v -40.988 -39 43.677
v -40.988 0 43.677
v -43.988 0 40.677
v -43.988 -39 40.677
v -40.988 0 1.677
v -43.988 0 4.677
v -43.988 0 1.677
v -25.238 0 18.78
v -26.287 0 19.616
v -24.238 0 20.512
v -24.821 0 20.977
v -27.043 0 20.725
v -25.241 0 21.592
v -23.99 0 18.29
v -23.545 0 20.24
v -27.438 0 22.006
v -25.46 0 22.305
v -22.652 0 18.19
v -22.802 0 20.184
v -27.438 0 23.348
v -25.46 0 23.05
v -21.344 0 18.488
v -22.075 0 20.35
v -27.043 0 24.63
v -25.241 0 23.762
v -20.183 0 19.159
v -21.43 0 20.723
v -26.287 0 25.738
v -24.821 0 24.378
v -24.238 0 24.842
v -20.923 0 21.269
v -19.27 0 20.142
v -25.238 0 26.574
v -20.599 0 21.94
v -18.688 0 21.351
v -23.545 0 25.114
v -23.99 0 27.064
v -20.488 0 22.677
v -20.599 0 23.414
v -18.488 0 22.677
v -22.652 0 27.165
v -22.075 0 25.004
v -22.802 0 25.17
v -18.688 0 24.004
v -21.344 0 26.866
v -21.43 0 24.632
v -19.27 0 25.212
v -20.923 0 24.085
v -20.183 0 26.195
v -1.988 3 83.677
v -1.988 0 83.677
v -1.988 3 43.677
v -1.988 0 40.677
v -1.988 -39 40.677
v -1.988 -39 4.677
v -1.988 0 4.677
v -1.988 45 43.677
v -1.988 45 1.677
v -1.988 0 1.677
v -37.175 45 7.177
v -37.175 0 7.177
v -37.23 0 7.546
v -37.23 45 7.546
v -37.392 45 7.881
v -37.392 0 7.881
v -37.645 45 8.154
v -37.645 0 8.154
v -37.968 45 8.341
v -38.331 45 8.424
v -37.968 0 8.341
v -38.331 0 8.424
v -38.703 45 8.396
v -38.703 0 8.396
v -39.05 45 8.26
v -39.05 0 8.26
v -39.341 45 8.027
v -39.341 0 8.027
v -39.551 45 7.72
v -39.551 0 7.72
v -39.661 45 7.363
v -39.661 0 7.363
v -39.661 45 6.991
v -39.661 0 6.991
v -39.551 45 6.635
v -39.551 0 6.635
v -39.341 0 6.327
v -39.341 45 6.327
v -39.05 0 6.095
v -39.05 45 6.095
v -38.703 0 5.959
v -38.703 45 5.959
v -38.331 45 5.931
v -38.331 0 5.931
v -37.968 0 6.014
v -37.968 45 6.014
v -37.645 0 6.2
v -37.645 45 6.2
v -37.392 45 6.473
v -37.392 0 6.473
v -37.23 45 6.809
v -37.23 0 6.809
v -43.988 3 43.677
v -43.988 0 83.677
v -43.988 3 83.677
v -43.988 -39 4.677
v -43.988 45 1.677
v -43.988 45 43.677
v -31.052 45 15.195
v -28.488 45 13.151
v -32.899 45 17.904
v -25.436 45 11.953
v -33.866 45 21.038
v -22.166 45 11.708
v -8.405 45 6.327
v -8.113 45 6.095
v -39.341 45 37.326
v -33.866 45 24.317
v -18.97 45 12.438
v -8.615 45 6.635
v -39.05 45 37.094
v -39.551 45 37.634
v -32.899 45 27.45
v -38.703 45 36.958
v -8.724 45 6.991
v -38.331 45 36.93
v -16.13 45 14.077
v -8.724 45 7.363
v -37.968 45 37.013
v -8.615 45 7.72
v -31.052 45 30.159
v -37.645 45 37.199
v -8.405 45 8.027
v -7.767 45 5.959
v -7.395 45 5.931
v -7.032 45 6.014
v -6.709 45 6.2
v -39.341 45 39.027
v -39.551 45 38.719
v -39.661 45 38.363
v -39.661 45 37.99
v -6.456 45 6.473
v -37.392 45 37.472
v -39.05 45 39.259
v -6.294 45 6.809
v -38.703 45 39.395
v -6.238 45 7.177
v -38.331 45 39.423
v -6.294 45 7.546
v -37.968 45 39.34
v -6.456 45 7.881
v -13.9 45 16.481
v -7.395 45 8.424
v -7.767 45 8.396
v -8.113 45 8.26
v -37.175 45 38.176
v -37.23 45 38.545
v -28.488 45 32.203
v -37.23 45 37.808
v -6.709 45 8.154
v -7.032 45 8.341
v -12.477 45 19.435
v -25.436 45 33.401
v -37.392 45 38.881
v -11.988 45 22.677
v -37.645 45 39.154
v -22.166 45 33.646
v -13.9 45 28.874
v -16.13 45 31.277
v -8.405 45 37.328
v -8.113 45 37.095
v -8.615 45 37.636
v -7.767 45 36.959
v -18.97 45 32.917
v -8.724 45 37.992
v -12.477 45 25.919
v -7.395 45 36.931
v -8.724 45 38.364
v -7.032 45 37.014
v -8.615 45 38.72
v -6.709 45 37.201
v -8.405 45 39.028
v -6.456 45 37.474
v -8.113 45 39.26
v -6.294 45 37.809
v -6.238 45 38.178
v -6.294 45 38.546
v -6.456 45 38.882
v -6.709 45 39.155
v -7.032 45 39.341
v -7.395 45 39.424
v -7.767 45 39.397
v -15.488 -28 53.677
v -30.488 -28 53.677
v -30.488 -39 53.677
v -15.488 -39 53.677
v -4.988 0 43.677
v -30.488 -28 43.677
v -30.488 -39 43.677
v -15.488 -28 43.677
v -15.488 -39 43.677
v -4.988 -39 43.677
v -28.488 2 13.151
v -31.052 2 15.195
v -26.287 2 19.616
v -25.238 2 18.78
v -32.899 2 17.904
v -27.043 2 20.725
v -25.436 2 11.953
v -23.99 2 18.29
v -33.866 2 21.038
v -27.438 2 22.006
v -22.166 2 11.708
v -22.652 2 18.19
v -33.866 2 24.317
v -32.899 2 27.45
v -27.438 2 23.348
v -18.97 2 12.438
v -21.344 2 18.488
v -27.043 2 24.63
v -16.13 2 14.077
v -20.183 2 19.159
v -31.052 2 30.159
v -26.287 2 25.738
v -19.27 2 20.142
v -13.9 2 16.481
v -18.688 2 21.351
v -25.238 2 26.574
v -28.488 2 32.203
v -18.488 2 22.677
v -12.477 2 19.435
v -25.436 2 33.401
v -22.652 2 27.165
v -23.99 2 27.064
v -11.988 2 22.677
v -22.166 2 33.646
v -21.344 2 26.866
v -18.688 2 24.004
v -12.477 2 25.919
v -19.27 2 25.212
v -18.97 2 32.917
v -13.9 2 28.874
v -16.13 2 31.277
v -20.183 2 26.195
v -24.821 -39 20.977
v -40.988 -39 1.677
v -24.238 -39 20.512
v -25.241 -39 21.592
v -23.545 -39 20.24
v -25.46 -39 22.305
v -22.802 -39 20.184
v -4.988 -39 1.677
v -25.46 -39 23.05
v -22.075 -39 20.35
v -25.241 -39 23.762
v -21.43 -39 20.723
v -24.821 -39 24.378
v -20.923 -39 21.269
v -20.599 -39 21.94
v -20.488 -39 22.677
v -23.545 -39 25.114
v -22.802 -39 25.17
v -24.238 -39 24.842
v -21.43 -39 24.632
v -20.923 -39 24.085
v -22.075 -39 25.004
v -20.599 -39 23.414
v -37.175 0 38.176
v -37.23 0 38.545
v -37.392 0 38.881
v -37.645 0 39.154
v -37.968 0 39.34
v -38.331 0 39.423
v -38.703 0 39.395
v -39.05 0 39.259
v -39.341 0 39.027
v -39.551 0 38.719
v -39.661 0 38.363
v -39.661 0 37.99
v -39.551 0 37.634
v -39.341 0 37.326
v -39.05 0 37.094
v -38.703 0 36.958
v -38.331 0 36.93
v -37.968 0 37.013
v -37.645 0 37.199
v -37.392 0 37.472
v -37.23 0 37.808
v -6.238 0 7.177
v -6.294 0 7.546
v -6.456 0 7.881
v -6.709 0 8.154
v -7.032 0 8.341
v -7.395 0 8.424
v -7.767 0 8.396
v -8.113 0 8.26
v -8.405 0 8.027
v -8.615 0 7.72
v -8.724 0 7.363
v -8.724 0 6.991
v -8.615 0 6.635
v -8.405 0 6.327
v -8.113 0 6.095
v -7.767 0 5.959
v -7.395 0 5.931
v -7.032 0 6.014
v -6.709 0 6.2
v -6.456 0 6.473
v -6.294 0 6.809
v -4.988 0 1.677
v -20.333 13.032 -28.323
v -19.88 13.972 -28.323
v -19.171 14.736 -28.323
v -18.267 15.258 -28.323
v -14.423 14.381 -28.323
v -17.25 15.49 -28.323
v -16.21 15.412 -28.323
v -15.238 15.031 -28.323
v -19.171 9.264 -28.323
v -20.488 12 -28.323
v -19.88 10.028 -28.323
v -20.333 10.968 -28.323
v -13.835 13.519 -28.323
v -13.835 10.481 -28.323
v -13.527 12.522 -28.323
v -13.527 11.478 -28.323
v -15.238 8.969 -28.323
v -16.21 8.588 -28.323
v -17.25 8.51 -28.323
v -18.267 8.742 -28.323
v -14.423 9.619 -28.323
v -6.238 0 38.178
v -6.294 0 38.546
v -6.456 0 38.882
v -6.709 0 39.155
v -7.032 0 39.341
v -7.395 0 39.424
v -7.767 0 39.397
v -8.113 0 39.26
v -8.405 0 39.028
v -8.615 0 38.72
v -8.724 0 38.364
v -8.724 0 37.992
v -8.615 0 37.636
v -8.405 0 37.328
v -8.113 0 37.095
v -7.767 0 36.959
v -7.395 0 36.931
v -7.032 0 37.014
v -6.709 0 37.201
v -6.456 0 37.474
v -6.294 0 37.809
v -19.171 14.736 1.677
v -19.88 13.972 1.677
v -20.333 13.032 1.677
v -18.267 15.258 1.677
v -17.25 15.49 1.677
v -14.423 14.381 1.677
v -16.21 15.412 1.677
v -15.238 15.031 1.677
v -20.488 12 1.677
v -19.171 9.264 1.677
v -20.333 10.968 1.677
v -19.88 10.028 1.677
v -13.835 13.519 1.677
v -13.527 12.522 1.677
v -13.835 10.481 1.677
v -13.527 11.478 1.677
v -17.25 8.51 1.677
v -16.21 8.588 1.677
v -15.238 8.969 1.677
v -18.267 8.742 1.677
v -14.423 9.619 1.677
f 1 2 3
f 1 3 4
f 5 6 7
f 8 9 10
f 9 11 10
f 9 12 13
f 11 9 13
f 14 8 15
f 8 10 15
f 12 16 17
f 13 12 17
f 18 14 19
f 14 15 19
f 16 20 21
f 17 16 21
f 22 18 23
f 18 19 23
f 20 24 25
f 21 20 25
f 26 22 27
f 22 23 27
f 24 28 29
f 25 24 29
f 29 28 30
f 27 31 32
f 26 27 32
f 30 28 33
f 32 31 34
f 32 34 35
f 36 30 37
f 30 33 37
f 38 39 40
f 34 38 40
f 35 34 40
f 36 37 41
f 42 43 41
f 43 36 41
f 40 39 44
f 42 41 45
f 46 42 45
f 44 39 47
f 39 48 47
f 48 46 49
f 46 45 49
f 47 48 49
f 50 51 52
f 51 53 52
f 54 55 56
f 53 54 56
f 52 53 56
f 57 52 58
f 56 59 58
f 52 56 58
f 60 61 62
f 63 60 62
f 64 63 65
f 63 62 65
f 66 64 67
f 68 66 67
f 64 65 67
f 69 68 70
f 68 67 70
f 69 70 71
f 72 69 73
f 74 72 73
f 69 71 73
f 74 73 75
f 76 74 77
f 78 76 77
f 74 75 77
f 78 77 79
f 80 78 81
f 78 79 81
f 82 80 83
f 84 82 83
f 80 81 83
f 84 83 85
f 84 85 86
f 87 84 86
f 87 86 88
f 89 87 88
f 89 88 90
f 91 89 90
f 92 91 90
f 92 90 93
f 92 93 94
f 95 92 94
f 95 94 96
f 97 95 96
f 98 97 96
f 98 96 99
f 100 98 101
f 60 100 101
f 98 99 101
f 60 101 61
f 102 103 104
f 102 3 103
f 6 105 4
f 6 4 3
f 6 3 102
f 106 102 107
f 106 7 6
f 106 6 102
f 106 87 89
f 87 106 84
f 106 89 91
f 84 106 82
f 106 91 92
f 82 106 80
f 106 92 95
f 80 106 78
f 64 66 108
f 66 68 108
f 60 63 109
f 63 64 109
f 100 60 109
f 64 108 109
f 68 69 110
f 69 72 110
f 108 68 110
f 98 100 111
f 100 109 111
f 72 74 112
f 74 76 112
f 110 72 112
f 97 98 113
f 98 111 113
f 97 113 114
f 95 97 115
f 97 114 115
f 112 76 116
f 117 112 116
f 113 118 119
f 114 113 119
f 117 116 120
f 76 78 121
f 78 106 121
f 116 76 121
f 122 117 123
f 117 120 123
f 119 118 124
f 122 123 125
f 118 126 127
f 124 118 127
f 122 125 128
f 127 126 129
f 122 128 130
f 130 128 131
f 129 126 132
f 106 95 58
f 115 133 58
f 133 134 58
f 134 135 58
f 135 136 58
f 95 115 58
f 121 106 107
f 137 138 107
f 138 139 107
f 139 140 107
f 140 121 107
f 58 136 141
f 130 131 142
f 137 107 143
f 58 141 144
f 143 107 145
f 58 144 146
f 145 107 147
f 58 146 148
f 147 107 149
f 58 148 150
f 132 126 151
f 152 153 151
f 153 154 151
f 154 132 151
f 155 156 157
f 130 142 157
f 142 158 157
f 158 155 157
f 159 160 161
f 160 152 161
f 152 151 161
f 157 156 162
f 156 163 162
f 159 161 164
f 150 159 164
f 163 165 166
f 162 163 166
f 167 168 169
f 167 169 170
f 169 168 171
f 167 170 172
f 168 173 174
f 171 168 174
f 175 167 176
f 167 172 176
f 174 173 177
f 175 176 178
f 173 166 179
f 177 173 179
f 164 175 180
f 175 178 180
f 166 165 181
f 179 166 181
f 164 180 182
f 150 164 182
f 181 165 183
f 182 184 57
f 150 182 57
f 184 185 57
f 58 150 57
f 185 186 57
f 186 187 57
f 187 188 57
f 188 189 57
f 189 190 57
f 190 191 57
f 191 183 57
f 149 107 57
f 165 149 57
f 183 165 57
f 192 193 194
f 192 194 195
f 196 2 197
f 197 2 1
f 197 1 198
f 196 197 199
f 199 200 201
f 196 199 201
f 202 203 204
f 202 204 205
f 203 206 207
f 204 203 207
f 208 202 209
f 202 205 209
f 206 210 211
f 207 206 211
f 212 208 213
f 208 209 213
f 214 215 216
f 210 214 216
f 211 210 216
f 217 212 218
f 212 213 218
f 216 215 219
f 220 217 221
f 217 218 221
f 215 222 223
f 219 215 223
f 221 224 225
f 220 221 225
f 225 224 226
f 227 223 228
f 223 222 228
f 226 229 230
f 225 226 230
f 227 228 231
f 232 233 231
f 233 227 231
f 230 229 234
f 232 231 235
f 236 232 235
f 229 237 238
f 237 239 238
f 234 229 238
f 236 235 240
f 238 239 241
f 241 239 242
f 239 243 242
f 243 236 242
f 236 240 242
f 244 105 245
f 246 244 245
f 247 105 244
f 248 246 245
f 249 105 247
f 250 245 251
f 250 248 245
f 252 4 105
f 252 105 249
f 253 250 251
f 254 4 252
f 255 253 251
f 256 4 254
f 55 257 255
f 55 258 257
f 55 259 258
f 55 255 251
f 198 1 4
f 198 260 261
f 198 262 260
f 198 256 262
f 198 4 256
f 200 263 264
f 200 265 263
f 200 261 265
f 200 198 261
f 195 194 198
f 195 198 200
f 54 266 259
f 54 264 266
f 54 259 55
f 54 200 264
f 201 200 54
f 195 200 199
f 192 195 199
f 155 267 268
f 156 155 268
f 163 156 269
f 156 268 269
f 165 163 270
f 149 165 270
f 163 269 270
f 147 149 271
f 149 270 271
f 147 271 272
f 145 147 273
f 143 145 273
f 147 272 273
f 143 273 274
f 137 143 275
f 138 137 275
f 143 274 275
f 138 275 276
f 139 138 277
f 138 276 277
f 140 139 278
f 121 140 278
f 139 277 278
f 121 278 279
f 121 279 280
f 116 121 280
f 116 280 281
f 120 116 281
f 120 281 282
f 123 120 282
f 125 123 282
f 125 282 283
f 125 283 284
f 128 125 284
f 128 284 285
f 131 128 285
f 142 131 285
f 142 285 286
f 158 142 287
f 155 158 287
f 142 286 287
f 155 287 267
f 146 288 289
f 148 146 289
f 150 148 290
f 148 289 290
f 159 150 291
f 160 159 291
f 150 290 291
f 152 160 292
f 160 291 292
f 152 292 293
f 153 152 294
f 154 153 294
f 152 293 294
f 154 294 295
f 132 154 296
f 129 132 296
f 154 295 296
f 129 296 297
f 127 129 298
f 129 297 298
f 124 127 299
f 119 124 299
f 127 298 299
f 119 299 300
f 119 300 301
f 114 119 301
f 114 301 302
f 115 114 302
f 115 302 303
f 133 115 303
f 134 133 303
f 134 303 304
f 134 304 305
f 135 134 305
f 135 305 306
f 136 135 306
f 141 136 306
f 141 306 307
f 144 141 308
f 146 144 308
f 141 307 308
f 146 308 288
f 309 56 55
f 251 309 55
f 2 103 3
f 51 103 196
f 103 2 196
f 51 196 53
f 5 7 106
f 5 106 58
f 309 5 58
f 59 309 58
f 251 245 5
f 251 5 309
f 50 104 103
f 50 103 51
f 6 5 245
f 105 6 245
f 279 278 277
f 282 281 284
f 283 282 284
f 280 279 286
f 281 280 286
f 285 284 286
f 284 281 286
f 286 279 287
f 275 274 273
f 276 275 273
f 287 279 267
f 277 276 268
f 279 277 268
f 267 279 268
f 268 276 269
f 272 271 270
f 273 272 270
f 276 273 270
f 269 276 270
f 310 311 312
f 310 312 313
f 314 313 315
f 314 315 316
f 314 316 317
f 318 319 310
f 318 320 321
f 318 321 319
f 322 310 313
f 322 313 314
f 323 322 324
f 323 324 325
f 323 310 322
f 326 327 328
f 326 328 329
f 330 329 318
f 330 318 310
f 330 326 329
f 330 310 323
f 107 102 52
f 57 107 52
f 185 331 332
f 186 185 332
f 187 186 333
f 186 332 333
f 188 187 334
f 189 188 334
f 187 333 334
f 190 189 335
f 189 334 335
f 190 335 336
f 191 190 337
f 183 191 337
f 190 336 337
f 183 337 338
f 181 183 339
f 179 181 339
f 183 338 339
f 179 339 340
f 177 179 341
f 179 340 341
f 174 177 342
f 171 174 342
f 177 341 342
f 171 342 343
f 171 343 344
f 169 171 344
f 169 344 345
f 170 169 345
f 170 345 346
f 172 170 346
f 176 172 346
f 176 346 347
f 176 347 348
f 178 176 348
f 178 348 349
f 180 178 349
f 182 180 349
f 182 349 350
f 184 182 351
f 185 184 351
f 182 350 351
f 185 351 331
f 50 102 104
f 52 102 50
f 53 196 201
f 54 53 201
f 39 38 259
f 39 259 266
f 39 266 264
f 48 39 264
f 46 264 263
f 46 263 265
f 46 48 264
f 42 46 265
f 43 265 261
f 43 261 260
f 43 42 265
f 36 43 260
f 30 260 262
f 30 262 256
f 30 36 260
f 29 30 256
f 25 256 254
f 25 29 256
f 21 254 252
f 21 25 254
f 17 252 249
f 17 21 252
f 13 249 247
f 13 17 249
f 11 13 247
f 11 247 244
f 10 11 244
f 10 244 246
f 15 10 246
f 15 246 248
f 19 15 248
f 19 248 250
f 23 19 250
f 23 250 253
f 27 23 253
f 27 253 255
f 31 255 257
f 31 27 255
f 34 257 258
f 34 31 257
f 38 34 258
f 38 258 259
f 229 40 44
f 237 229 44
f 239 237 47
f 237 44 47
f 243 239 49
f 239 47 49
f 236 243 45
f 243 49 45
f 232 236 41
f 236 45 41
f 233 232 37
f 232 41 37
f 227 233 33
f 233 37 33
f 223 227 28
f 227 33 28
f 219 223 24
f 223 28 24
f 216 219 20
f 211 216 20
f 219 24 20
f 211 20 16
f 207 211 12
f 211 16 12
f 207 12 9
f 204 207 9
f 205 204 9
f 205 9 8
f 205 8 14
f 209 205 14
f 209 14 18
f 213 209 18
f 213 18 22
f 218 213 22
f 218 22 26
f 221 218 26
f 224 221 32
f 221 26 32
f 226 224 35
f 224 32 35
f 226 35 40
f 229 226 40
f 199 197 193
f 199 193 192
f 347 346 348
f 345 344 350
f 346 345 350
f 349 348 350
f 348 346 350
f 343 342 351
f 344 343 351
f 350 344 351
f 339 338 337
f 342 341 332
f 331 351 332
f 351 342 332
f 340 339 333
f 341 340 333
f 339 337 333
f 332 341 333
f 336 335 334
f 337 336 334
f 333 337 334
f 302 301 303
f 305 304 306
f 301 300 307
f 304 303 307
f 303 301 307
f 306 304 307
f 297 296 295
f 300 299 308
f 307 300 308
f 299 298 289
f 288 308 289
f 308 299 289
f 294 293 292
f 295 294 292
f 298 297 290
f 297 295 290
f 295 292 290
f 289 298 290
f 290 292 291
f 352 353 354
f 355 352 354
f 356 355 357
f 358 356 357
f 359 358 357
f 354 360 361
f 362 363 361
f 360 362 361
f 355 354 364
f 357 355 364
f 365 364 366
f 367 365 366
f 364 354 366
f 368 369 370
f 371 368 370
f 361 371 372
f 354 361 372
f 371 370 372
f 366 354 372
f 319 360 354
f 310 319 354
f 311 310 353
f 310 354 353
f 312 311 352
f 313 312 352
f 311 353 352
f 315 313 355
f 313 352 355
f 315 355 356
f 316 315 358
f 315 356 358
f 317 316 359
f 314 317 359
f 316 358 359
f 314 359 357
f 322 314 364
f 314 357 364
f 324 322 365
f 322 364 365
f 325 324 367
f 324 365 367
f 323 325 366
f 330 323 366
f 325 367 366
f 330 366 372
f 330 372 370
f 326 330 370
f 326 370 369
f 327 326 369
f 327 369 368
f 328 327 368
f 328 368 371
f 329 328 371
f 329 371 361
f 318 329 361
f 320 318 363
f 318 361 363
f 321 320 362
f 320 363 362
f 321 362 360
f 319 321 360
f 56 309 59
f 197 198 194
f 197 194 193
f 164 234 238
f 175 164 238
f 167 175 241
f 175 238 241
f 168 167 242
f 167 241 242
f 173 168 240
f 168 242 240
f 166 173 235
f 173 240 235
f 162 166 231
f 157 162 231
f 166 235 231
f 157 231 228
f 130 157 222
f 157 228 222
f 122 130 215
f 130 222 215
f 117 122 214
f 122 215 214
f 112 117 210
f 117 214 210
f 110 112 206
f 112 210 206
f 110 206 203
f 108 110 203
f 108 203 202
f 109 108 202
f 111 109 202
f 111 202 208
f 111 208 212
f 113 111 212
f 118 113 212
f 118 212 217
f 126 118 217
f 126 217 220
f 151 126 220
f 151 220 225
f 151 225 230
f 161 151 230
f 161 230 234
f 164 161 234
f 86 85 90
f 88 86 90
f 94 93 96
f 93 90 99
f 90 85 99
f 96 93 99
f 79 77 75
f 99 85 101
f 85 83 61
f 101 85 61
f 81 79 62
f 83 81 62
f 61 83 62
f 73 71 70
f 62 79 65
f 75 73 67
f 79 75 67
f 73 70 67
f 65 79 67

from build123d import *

# Parameters (mm, degrees)
F0_W      = 42
F0_H      = 42
F0_R      = 1.25
F0_R_2    = 11
F0_R_3    = 4.5
F0_R_4    = 2.5
F1_DEPTH  = 39
F2_SIZE   = 3
F3_DEPTH  = 2
F5_W      = 15
F5_H      = 11
F6_DEPTH  = 10
F7_DEPTH  = 45
F8_W      = 42
F8_H      = 3
F9_DEPTH  = 40
F11_DEPTH = 30


# Not quite as in the source:
# - the program builds the solid bodies; features that only make, move or delete a surface that nothing else refers to are left out


with BuildPart() as f1:
    # F0 (on Front) → F1 (new body)
    with BuildSketch(Plane.XZ):
        with Locations((-22.9883964362, 22.6771618161)):
            Rectangle(F0_W, F0_H)
        with Locations((-38.4247341791, 7.1771618161)):
            Circle(F0_R, mode=Mode.SUBTRACT)
        with Locations((-7.4883964362, 7.1771618161)):
            Circle(F0_R, mode=Mode.SUBTRACT)
        with Locations((-38.4247341791, 38.1764436699)):
            Circle(F0_R, mode=Mode.SUBTRACT)
        with Locations((-22.9883964362, 22.6771618161)):
            Circle(F0_R_2, mode=Mode.SUBTRACT)
        with Locations((-7.4883964362, 38.1778829577)):
            Circle(F0_R, mode=Mode.SUBTRACT)
        with Locations((-22.9883964362, 22.6771618161)):
            Circle(F0_R_2)
        with Locations((-22.9883964362, 22.6771618161)):
            Circle(F0_R_3, mode=Mode.SUBTRACT)
        with Locations((-22.9883964362, 22.6771618161)):
            Circle(F0_R_3)
        with Locations((-22.9883964362, 22.6771618161)):
            Circle(F0_R_4, mode=Mode.SUBTRACT)
        with Locations((-38.4247341791, 38.1764436699)):
            Circle(F0_R)
        with Locations((-7.4883964362, 7.1771618161)):
            Circle(F0_R)
        with Locations((-38.4247341791, 7.1771618161)):
            Circle(F0_R)
        with Locations((-7.4883964362, 38.1778829577)):
            Circle(F0_R)
    extrude(amount=F1_DEPTH)

    # F2
    f2_edges = [f1.edges().sort_by_distance(p)[0] for p in [
        (-43.988396, -19.5, 1.677162),
        (-1.988396, -19.5, 1.677162),
        (-1.988396, -19.5, 43.677162),
        (-43.988396, -19.5, 43.677162),
    ]]
    chamfer(f2_edges, length=F2_SIZE)

    # F0 (on Front) → F3 (join)
    with BuildSketch(Plane.XZ):
        with Locations((-22.9883964362, 22.6771618161)):
            Circle(F0_R_2)
        with Locations((-22.9883964362, 22.6771618161)):
            Circle(F0_R_3, mode=Mode.SUBTRACT)
    extrude(amount=-F3_DEPTH)

    # F5 (on face) → F6 (join)
    with BuildSketch(Plane.XY.offset(43.6771618161)):
        with Locations((-22.9883964362, -33.5)):
            Rectangle(F5_W, F5_H)
    extrude(amount=F6_DEPTH)

    # F0 (on Front) → F7 (join)
    with BuildSketch(Plane.XZ):
        with Locations((-22.9883964362, 22.6771618161)):
            Rectangle(F0_W, F0_H)
        with Locations((-38.4247341791, 7.1771618161)):
            Circle(F0_R, mode=Mode.SUBTRACT)
        with Locations((-7.4883964362, 7.1771618161)):
            Circle(F0_R, mode=Mode.SUBTRACT)
        with Locations((-38.4247341791, 38.1764436699)):
            Circle(F0_R, mode=Mode.SUBTRACT)
        with Locations((-22.9883964362, 22.6771618161)):
            Circle(F0_R_2, mode=Mode.SUBTRACT)
        with Locations((-7.4883964362, 38.1778829577)):
            Circle(F0_R, mode=Mode.SUBTRACT)
    extrude(amount=-F7_DEPTH)

    # F8 (on face) → F9 (join)
    with BuildSketch(Plane.XY.offset(43.6771618161)):
        with Locations((-22.9883964362, 1.5)):
            Rectangle(F8_W, F8_H)
    extrude(amount=F9_DEPTH)


with BuildPart() as f11:
    # F10 (on face) → F11 (new body)
    with BuildSketch(Plane(origin=(0, 0, 1.6771618161), x_dir=(1, 0, 0), z_dir=(0, 0, -1))):
        with BuildLine():
            Line((-20.4883964362, -12), (-13.4883964362, -12))
            ThreePointArc((-13.4883964362, -12), (-16.9883964362, -8.5), (-20.4883964362, -12))
        make_face()
        with BuildLine():
            ThreePointArc((-20.4883964362, -12), (-16.9883964362, -15.5), (-13.4883964362, -12))
            Line((-13.4883964362, -12), (-20.4883964362, -12))
        make_face()
    extrude(amount=F11_DEPTH)


solid = Compound([f1.part, f11.part])
